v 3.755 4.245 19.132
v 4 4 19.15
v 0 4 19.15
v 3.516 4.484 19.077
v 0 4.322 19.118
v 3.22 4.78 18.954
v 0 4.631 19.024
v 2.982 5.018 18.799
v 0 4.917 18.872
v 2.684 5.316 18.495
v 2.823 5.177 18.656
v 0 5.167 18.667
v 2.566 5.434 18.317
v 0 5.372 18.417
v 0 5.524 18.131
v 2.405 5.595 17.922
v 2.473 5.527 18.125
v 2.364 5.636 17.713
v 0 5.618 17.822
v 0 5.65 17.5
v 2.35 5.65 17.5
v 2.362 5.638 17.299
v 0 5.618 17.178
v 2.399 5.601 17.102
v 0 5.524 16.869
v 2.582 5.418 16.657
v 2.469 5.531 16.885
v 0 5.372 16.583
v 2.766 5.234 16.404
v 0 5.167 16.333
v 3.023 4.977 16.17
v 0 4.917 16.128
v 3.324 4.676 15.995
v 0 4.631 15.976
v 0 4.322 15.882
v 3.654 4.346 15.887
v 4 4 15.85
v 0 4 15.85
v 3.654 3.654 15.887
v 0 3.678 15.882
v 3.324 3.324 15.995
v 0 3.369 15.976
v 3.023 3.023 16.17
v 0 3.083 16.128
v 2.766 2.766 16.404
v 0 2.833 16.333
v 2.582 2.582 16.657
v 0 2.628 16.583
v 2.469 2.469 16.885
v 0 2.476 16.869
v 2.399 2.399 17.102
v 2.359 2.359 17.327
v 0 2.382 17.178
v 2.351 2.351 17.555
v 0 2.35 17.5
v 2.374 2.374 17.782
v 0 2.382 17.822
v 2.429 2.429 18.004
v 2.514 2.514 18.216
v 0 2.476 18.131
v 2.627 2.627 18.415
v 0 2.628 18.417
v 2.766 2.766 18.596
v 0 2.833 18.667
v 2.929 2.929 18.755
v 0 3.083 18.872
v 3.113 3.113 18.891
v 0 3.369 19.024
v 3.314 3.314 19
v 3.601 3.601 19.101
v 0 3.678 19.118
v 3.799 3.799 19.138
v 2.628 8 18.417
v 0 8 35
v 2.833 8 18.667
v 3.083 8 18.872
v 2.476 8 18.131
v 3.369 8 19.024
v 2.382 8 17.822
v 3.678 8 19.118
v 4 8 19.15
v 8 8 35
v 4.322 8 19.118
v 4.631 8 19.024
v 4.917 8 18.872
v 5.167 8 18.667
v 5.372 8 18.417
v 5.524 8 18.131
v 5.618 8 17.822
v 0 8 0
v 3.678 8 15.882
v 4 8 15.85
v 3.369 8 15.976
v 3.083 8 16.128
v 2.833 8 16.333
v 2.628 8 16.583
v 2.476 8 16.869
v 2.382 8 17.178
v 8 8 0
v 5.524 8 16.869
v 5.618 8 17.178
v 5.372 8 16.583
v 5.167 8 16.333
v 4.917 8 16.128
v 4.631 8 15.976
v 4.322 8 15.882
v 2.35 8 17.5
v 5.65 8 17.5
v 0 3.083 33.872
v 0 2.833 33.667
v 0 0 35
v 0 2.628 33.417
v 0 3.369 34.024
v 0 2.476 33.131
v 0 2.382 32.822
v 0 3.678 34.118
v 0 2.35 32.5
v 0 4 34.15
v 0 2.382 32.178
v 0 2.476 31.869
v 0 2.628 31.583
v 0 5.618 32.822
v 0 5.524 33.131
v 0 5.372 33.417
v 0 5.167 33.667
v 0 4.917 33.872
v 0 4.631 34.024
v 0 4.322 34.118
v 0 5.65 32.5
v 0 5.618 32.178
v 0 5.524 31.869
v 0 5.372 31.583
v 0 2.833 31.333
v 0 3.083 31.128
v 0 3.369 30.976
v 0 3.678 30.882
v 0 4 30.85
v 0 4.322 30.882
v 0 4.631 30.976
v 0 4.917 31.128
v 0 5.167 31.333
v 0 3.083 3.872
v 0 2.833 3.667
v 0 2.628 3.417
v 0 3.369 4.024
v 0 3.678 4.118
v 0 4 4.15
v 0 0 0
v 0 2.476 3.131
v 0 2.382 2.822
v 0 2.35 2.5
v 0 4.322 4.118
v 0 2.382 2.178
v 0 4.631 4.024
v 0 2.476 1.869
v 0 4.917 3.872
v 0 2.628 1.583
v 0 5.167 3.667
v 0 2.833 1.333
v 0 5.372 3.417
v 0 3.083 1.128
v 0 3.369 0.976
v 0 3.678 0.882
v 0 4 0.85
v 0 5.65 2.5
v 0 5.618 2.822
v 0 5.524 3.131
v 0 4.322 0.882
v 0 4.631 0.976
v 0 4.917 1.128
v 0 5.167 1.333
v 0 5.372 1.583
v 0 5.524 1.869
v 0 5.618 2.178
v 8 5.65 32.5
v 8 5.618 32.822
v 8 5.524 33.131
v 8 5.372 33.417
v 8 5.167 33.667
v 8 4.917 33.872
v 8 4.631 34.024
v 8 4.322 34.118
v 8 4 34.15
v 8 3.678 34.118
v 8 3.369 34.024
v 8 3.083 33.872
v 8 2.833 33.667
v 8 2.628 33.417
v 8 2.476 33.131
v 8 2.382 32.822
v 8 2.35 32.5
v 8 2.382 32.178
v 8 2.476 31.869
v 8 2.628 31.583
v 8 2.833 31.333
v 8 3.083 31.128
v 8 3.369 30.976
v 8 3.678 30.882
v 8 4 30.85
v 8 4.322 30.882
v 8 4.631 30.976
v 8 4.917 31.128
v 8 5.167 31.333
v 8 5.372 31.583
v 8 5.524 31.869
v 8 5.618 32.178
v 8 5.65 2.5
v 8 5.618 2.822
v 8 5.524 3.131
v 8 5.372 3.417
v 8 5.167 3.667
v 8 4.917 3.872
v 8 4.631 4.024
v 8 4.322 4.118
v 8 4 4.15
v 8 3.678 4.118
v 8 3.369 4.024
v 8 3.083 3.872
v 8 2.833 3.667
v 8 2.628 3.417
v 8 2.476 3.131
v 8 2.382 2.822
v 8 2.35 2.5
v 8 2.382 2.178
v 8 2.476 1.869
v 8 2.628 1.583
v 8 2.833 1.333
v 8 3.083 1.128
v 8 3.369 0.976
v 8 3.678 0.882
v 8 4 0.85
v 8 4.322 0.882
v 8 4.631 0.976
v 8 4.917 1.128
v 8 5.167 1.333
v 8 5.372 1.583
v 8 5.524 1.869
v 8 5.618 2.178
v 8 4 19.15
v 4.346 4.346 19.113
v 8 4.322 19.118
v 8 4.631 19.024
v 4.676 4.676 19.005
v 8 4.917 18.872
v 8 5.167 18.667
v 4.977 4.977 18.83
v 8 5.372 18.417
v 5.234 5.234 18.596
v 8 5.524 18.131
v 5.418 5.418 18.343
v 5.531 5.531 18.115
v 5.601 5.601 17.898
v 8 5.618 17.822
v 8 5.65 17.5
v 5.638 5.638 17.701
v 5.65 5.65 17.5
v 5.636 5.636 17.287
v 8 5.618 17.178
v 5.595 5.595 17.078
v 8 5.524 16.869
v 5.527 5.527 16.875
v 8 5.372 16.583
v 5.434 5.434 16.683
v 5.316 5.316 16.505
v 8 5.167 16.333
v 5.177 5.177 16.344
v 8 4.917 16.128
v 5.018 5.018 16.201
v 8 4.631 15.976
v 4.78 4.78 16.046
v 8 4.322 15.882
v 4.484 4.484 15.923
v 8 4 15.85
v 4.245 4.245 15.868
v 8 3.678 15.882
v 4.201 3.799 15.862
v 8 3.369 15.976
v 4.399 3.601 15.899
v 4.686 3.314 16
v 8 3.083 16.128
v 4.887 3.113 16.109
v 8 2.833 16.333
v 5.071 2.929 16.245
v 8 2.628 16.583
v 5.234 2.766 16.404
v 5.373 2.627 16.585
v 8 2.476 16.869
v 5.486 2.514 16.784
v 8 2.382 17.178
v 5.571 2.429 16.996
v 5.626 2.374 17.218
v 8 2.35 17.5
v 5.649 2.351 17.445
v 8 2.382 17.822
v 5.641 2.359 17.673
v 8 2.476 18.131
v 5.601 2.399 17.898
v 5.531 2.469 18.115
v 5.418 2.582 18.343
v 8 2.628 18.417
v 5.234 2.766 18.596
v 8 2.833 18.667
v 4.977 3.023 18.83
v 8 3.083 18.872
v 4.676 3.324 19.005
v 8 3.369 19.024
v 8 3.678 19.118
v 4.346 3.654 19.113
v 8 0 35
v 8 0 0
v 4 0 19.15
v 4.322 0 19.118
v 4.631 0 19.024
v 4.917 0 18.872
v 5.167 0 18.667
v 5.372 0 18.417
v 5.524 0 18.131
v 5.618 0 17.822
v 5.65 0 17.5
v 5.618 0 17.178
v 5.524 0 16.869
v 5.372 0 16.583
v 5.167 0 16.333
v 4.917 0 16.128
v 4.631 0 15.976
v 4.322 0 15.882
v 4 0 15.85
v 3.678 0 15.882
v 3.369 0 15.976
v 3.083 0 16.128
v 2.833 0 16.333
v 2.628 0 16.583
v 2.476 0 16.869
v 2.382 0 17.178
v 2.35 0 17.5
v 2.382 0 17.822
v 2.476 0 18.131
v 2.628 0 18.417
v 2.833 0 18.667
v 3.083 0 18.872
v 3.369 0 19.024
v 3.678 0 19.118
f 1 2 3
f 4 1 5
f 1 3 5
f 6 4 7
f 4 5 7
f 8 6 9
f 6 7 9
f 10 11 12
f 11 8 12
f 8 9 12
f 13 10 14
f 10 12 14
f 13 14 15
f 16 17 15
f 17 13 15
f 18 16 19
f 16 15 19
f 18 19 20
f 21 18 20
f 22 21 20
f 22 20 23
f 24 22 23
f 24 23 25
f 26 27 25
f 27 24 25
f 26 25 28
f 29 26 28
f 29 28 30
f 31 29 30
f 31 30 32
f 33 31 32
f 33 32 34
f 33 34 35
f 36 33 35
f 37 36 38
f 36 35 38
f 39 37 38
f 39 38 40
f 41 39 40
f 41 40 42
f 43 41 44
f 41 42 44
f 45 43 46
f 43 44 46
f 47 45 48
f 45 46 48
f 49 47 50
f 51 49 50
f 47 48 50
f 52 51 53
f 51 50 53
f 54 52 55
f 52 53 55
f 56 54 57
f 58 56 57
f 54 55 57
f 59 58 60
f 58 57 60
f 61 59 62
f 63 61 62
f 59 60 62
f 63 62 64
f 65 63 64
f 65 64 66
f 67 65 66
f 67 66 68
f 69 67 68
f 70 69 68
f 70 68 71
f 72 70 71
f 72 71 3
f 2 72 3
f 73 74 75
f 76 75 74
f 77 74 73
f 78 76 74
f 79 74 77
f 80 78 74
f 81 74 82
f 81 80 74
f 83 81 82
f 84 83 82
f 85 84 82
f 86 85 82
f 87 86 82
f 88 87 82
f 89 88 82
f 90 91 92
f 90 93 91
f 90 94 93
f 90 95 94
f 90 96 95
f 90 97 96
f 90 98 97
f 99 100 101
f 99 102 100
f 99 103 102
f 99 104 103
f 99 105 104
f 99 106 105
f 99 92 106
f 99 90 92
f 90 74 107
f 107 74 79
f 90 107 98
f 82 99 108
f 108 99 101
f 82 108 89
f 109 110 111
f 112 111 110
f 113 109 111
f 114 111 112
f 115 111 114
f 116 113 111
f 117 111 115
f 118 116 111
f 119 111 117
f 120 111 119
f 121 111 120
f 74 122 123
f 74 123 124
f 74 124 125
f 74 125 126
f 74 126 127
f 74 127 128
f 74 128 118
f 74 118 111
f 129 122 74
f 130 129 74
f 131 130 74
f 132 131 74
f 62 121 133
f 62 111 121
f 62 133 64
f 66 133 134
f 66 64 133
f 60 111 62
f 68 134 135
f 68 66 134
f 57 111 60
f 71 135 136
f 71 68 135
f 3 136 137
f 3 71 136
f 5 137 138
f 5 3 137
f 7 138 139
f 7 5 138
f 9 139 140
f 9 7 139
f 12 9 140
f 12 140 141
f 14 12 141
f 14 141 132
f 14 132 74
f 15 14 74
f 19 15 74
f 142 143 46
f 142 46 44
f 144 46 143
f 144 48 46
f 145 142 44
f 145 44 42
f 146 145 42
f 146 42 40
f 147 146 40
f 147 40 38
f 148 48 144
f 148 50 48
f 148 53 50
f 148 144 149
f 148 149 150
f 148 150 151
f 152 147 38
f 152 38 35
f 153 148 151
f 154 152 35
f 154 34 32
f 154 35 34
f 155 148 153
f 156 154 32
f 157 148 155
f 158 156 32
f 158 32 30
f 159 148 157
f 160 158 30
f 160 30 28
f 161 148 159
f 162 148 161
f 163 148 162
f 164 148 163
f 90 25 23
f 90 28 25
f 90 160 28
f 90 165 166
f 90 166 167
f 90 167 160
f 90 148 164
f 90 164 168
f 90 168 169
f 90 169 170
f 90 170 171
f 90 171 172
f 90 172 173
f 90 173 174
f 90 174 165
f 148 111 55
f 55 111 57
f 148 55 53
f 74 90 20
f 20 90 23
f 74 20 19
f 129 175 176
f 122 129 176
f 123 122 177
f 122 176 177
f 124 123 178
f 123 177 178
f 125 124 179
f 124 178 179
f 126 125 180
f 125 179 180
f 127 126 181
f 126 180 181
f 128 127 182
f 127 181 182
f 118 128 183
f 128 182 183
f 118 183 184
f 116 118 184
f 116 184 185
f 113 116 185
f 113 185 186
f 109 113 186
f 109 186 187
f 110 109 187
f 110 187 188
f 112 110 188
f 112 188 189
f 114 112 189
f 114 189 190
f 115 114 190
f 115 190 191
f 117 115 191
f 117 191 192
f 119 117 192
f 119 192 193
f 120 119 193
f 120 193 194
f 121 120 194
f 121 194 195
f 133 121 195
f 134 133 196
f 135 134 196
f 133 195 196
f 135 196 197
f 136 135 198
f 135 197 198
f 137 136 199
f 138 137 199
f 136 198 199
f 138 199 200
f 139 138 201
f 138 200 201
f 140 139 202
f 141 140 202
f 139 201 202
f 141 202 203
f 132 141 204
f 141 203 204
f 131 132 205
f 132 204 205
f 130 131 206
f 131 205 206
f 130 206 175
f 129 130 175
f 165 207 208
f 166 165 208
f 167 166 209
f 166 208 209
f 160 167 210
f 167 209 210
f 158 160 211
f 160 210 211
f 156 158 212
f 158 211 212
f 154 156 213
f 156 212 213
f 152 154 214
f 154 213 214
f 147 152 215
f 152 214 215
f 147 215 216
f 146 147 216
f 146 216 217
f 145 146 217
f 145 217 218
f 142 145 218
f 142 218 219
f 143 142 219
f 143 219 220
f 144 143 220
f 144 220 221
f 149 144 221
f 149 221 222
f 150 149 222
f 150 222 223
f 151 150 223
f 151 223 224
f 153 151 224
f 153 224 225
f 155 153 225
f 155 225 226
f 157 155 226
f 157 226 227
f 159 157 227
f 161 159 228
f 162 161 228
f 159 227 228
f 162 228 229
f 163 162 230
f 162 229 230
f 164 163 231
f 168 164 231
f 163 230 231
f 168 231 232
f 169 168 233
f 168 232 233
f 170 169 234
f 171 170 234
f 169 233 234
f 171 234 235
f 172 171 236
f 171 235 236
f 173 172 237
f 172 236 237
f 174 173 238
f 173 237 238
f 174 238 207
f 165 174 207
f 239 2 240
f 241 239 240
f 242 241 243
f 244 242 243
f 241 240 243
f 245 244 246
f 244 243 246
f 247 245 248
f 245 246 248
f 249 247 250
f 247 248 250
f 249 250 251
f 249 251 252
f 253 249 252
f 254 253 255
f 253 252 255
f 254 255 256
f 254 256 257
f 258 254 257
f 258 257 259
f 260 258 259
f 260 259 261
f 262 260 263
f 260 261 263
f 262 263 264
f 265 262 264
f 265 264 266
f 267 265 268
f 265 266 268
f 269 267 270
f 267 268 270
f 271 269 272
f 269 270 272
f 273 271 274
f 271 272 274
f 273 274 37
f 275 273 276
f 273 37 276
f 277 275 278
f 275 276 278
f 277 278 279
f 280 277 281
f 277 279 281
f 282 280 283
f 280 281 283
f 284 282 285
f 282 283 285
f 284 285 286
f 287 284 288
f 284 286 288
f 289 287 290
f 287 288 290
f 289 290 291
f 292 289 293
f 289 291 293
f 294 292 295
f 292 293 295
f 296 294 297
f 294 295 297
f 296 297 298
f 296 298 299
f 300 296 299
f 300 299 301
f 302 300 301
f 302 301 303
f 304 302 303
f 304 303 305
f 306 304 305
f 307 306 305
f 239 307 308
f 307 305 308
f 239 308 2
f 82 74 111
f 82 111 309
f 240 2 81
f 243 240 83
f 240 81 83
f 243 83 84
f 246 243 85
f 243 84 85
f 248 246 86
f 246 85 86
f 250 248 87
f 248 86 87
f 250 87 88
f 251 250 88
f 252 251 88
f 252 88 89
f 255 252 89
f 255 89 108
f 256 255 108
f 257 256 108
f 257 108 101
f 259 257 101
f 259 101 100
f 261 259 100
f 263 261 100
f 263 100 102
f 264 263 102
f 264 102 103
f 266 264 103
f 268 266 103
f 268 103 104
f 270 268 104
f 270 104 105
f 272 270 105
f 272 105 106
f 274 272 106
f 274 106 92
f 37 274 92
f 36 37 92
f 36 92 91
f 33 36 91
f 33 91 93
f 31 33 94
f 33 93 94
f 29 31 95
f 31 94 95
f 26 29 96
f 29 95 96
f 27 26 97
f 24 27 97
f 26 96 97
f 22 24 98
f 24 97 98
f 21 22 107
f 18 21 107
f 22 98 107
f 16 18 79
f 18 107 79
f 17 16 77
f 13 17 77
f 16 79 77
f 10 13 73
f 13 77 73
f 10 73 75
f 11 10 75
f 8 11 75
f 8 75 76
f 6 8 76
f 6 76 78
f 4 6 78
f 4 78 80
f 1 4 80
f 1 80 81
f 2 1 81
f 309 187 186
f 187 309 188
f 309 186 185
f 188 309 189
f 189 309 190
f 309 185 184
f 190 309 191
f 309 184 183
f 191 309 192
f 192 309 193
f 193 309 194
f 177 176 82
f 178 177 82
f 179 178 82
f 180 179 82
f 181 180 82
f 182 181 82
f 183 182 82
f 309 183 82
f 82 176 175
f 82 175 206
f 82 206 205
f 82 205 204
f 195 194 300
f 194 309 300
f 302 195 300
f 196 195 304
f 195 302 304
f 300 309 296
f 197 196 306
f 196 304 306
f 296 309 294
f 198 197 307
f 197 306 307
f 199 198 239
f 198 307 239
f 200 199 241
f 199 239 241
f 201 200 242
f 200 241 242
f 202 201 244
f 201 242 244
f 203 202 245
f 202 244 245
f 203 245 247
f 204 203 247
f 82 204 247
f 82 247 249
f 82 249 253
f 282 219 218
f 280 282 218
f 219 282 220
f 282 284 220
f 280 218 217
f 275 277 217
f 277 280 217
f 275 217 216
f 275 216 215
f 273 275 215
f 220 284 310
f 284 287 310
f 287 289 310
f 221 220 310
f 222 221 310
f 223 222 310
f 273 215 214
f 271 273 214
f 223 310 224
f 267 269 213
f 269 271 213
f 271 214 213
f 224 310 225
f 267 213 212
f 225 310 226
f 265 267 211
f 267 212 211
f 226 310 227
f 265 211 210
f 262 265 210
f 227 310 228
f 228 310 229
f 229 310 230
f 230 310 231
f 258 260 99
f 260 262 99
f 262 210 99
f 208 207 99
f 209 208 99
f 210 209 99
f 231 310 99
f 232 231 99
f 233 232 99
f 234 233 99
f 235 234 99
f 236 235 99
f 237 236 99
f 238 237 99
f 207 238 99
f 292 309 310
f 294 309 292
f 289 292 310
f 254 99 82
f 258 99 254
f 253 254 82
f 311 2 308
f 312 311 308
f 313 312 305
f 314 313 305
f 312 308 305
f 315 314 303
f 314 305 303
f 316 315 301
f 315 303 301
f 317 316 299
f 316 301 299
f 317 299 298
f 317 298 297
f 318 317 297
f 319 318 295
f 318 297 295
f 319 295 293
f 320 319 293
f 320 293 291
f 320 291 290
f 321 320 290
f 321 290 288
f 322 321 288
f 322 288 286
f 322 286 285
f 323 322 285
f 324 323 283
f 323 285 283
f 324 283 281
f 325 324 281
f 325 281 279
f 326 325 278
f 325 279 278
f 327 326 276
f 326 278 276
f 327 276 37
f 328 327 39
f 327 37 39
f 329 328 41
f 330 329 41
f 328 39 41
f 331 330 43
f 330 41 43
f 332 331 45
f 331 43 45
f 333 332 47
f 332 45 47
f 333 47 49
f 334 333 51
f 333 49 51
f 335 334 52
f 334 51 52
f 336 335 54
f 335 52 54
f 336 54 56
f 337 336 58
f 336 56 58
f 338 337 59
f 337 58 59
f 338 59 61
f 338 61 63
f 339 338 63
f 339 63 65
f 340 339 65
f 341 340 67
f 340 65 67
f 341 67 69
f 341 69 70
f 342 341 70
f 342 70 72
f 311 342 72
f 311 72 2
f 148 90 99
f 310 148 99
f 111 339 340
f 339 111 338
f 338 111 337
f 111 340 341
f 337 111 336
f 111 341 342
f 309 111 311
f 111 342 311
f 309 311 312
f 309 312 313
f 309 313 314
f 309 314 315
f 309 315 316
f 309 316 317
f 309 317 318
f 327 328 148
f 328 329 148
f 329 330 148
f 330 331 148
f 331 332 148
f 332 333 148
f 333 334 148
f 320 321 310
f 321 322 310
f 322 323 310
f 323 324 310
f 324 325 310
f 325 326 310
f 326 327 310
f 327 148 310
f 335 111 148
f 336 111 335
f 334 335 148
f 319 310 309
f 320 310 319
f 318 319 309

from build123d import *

# Parameters (mm, degrees)
SKETCH_1_W          = 8
SKETCH_1_H          = 8
EXTRUDE_1_DEPTH     = 35
SKETCH_2_R          = 1.65
CUT_EXTRUDE_1_DEPTH = 40
SKETCH_3_R          = 1.65
CUT_EXTRUDE_2_DEPTH = 40
SKETCH_6_R          = 1.5
CUT_EXTRUDE_4_DEPTH = 37.783148315
HOLE_WIZARD_M4_3_D  = 3.3


with BuildPart() as part:
    # 草图1 → 凸台-拉伸1 (new body)
    with BuildSketch(Plane.XY):
        with Locations((4, 4)):
            Rectangle(SKETCH_1_W, SKETCH_1_H)
    extrude(amount=EXTRUDE_1_DEPTH)

    # 草图2 → 切除-拉伸1 (cut)
    with BuildSketch(Plane(origin=(8, 0, 0), x_dir=(0, 0, -1), z_dir=(1, 0, 0))):
        with Locations(Location((-32.5, 4, 0), (0, 0, 90))):
            Circle(SKETCH_2_R)
        with Locations(Location((-2.5, 4, 0), (0, 0, 90))):
            Circle(SKETCH_2_R)
    extrude(amount=-CUT_EXTRUDE_1_DEPTH, mode=Mode.SUBTRACT)

    # 草图3 → 切除-拉伸2 (cut)
    with BuildSketch(Plane(origin=(0, 8, 0), x_dir=(1, 0, 0), z_dir=(0, 1, 0))):
        with Locations(Location((4, -17.5, 0), (0, 0, 270))):
            Circle(SKETCH_3_R)
    extrude(amount=-CUT_EXTRUDE_2_DEPTH, mode=Mode.SUBTRACT)

    # 草图6 → 切除-拉伸4 (cut, through all)
    with BuildSketch(Plane(origin=(8, 0, 0), x_dir=(0, 0, -1), z_dir=(1, 0, 0))):
        with Locations(Location((-17.5, 4, 0), (0, 0, 90))):
            Circle(SKETCH_6_R)
    extrude(amount=-CUT_EXTRUDE_4_DEPTH, mode=Mode.SUBTRACT)

    # M4 螺纹孔3 (through all)
    with Locations(Plane(origin=(8, 0, 0), x_dir=(0, 0, -1), z_dir=(1, 0, 0))):
        with Locations((-17.5, 4)):
            Hole(HOLE_WIZARD_M4_3_D / 2)


solid = part.part
